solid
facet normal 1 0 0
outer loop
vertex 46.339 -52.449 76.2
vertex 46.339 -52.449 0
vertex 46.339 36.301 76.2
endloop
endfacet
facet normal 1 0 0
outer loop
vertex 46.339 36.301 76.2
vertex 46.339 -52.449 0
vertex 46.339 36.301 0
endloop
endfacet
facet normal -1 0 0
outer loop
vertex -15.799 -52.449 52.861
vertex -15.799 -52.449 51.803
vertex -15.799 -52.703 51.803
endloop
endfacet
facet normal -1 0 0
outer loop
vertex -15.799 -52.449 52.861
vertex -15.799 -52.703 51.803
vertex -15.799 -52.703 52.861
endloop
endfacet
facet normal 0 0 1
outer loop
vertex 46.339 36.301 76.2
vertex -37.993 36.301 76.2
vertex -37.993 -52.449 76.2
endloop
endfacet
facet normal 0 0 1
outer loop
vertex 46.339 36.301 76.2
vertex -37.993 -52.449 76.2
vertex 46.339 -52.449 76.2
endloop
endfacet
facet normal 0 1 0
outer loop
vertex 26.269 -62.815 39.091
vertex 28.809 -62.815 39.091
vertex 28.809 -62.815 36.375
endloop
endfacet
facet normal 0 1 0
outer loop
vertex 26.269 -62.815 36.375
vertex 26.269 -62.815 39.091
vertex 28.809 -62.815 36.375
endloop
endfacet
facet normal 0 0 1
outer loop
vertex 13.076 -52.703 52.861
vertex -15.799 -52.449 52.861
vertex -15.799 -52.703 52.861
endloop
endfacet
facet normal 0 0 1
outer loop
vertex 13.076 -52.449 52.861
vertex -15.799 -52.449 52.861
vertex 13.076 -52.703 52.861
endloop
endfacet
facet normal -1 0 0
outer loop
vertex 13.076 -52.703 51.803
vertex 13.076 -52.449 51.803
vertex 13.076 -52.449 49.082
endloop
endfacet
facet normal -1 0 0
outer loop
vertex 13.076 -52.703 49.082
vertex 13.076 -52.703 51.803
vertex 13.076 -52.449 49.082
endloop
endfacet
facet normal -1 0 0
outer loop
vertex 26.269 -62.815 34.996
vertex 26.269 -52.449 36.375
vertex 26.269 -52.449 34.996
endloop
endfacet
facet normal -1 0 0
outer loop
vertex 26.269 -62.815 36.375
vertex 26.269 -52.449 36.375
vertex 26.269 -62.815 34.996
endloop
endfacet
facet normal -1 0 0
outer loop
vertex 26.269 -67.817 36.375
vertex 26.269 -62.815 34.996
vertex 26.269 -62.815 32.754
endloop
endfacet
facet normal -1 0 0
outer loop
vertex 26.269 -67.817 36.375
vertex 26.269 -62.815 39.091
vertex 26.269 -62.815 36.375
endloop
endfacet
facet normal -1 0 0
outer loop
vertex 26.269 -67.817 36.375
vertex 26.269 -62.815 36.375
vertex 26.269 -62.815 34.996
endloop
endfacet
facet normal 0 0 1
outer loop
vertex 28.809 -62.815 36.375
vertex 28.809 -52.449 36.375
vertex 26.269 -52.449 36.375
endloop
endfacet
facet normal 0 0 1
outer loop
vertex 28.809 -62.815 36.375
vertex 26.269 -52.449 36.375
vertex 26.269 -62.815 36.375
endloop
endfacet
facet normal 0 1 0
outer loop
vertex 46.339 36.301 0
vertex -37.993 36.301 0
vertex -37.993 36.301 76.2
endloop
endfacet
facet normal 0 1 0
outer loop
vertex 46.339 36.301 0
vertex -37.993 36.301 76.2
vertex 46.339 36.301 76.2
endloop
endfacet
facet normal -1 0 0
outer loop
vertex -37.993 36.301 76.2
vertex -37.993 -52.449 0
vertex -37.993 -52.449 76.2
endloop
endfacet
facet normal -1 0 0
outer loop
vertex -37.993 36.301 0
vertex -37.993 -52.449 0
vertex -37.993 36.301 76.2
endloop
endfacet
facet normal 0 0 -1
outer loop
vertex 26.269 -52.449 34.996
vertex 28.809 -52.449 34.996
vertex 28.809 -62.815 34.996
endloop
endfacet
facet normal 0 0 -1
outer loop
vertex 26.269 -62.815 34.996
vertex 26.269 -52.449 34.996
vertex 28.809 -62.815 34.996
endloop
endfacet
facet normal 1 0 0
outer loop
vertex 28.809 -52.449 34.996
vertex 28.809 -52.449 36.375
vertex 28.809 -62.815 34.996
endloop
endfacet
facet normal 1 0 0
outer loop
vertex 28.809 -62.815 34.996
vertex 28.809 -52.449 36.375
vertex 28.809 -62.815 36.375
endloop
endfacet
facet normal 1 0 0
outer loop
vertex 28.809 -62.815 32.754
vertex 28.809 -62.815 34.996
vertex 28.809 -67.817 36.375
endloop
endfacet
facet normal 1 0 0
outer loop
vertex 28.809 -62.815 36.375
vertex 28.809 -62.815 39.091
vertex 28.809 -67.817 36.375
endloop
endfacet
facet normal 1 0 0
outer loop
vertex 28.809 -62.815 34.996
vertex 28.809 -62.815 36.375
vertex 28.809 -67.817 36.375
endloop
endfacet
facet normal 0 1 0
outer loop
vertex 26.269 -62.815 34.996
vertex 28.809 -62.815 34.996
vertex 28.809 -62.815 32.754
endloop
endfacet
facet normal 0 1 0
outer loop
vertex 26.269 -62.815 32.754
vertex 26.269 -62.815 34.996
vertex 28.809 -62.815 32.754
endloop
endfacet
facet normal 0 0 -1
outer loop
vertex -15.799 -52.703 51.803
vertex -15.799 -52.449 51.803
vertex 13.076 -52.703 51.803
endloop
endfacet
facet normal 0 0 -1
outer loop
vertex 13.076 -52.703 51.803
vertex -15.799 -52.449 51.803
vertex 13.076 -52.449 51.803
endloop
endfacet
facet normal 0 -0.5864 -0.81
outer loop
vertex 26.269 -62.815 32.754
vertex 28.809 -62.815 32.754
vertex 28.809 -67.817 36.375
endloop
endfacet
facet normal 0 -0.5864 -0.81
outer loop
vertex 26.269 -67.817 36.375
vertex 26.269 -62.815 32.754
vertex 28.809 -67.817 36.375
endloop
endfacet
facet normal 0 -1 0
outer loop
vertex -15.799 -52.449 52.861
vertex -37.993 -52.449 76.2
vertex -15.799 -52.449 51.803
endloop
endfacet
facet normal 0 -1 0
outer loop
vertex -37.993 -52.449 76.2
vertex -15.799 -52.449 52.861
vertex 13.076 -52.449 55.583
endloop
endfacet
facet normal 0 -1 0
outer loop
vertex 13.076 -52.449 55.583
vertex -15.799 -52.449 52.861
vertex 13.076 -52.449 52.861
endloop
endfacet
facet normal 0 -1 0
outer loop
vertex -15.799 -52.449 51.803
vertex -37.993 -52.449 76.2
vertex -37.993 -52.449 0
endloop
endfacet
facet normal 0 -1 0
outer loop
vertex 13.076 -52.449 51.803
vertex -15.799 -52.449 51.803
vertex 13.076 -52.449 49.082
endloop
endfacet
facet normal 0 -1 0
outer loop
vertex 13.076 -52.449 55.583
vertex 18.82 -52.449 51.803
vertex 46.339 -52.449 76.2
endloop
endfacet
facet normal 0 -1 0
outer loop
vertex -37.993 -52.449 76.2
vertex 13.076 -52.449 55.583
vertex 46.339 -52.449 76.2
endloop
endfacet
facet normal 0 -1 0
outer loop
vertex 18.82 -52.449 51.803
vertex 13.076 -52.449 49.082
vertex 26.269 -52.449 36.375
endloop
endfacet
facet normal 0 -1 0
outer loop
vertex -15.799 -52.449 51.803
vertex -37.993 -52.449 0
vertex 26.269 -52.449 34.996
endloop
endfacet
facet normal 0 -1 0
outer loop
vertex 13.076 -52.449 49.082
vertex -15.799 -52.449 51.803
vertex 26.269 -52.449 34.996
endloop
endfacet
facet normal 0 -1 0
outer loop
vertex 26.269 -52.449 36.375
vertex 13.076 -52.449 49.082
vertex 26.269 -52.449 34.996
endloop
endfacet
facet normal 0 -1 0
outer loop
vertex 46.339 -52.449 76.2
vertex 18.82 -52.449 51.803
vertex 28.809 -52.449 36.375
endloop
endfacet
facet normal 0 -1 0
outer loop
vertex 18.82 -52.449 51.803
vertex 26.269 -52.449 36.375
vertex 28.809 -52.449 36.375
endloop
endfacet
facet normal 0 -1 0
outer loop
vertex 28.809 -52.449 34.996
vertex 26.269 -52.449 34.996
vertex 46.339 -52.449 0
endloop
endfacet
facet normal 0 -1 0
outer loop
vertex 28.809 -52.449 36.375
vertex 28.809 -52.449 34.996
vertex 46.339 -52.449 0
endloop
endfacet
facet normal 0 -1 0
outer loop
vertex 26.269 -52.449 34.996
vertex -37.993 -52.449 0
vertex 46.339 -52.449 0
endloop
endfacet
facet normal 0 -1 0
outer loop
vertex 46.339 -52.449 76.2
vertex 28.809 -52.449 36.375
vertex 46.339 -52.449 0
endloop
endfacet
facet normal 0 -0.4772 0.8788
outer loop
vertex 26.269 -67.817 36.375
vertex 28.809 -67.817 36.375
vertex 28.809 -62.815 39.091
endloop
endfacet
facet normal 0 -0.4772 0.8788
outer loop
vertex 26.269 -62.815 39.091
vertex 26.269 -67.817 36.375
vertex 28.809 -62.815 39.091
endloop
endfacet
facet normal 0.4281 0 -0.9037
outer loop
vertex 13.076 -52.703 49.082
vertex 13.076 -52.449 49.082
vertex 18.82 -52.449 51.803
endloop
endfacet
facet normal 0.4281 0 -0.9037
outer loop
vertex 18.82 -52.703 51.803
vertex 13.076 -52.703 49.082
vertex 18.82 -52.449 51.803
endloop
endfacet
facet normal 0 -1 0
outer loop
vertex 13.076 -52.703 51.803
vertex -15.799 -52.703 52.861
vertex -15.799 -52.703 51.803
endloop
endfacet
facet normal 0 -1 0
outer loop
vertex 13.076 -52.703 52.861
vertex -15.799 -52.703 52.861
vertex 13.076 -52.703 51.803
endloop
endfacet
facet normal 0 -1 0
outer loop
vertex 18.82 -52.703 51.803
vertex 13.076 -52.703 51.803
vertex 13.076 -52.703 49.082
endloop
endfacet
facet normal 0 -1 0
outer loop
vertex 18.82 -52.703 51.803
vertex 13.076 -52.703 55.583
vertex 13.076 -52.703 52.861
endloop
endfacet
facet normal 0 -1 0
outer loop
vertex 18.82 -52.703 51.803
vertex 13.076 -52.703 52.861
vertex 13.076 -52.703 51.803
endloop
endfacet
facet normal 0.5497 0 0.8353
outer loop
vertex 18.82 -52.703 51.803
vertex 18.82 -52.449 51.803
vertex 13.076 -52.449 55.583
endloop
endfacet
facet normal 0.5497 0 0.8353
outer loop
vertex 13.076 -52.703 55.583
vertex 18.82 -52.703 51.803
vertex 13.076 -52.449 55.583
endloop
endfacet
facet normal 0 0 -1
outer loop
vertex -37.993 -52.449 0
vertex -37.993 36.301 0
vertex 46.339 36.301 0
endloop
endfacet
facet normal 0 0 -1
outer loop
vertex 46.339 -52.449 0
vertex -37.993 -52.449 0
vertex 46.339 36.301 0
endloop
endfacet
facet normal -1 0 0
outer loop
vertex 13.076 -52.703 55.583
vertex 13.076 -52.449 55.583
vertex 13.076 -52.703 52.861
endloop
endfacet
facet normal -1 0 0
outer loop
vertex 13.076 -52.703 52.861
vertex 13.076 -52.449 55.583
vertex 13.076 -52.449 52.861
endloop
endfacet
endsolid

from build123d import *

# Parameters (mm, degrees)
F0_W     = 84.3321233988
F0_H     = 88.7495167553
F1_DEPTH = 76.2
F4_W     = 28.8745099679
F4_H     = 1.0582283139
F5_DEPTH = 0.254
F7_W     = 16.5562033653
F7_H     = 1.3796836138
F8_DEPTH = 2.54


# Not quite as in the source:
# - the program builds the solid bodies; features that only make, move or delete a surface that nothing else refers to are left out


with BuildPart() as f1:
    # F0 (on Top) → F1 (new body)
    with BuildSketch(Plane.XY):
        with Locations((4.1730180383, -8.0741699785)):
            Rectangle(F0_W, F0_H)
    extrude(amount=F1_DEPTH)

    # F4 (on face) → F5 (join)
    with BuildSketch(Plane.XZ.offset(52.4489283562)):
        with Locations((-1.3617197983, 52.3322783411)):
            Rectangle(F4_W, F4_H)
        Polygon((13.0755351856, 55.5825531483), (13.0755351856, 52.861392498), (13.0755351856, 51.8031641841), (13.0755351856, 49.0820072591), (18.8202019781, 51.8031641841), align=None)
    extrude(amount=F5_DEPTH)

    # F7 (on offset) → F8 (join)
    with BuildSketch(Plane(origin=(28.8089563389, 0, 0), x_dir=(0, -1, 0), z_dir=(-1, 0, 0))):
        with Locations((54.5372888446, 35.6855541468)):
            Rectangle(F7_W, F7_H)
        Polygon((62.8153905272, 39.0911102295), (62.8153905272, 36.3753959537), (62.8153905272, 34.9957123399), (62.8153905272, 32.7537246048), (67.8167492151, 36.3753959537), align=None)
    extrude(amount=F8_DEPTH)


solid = f1.part
